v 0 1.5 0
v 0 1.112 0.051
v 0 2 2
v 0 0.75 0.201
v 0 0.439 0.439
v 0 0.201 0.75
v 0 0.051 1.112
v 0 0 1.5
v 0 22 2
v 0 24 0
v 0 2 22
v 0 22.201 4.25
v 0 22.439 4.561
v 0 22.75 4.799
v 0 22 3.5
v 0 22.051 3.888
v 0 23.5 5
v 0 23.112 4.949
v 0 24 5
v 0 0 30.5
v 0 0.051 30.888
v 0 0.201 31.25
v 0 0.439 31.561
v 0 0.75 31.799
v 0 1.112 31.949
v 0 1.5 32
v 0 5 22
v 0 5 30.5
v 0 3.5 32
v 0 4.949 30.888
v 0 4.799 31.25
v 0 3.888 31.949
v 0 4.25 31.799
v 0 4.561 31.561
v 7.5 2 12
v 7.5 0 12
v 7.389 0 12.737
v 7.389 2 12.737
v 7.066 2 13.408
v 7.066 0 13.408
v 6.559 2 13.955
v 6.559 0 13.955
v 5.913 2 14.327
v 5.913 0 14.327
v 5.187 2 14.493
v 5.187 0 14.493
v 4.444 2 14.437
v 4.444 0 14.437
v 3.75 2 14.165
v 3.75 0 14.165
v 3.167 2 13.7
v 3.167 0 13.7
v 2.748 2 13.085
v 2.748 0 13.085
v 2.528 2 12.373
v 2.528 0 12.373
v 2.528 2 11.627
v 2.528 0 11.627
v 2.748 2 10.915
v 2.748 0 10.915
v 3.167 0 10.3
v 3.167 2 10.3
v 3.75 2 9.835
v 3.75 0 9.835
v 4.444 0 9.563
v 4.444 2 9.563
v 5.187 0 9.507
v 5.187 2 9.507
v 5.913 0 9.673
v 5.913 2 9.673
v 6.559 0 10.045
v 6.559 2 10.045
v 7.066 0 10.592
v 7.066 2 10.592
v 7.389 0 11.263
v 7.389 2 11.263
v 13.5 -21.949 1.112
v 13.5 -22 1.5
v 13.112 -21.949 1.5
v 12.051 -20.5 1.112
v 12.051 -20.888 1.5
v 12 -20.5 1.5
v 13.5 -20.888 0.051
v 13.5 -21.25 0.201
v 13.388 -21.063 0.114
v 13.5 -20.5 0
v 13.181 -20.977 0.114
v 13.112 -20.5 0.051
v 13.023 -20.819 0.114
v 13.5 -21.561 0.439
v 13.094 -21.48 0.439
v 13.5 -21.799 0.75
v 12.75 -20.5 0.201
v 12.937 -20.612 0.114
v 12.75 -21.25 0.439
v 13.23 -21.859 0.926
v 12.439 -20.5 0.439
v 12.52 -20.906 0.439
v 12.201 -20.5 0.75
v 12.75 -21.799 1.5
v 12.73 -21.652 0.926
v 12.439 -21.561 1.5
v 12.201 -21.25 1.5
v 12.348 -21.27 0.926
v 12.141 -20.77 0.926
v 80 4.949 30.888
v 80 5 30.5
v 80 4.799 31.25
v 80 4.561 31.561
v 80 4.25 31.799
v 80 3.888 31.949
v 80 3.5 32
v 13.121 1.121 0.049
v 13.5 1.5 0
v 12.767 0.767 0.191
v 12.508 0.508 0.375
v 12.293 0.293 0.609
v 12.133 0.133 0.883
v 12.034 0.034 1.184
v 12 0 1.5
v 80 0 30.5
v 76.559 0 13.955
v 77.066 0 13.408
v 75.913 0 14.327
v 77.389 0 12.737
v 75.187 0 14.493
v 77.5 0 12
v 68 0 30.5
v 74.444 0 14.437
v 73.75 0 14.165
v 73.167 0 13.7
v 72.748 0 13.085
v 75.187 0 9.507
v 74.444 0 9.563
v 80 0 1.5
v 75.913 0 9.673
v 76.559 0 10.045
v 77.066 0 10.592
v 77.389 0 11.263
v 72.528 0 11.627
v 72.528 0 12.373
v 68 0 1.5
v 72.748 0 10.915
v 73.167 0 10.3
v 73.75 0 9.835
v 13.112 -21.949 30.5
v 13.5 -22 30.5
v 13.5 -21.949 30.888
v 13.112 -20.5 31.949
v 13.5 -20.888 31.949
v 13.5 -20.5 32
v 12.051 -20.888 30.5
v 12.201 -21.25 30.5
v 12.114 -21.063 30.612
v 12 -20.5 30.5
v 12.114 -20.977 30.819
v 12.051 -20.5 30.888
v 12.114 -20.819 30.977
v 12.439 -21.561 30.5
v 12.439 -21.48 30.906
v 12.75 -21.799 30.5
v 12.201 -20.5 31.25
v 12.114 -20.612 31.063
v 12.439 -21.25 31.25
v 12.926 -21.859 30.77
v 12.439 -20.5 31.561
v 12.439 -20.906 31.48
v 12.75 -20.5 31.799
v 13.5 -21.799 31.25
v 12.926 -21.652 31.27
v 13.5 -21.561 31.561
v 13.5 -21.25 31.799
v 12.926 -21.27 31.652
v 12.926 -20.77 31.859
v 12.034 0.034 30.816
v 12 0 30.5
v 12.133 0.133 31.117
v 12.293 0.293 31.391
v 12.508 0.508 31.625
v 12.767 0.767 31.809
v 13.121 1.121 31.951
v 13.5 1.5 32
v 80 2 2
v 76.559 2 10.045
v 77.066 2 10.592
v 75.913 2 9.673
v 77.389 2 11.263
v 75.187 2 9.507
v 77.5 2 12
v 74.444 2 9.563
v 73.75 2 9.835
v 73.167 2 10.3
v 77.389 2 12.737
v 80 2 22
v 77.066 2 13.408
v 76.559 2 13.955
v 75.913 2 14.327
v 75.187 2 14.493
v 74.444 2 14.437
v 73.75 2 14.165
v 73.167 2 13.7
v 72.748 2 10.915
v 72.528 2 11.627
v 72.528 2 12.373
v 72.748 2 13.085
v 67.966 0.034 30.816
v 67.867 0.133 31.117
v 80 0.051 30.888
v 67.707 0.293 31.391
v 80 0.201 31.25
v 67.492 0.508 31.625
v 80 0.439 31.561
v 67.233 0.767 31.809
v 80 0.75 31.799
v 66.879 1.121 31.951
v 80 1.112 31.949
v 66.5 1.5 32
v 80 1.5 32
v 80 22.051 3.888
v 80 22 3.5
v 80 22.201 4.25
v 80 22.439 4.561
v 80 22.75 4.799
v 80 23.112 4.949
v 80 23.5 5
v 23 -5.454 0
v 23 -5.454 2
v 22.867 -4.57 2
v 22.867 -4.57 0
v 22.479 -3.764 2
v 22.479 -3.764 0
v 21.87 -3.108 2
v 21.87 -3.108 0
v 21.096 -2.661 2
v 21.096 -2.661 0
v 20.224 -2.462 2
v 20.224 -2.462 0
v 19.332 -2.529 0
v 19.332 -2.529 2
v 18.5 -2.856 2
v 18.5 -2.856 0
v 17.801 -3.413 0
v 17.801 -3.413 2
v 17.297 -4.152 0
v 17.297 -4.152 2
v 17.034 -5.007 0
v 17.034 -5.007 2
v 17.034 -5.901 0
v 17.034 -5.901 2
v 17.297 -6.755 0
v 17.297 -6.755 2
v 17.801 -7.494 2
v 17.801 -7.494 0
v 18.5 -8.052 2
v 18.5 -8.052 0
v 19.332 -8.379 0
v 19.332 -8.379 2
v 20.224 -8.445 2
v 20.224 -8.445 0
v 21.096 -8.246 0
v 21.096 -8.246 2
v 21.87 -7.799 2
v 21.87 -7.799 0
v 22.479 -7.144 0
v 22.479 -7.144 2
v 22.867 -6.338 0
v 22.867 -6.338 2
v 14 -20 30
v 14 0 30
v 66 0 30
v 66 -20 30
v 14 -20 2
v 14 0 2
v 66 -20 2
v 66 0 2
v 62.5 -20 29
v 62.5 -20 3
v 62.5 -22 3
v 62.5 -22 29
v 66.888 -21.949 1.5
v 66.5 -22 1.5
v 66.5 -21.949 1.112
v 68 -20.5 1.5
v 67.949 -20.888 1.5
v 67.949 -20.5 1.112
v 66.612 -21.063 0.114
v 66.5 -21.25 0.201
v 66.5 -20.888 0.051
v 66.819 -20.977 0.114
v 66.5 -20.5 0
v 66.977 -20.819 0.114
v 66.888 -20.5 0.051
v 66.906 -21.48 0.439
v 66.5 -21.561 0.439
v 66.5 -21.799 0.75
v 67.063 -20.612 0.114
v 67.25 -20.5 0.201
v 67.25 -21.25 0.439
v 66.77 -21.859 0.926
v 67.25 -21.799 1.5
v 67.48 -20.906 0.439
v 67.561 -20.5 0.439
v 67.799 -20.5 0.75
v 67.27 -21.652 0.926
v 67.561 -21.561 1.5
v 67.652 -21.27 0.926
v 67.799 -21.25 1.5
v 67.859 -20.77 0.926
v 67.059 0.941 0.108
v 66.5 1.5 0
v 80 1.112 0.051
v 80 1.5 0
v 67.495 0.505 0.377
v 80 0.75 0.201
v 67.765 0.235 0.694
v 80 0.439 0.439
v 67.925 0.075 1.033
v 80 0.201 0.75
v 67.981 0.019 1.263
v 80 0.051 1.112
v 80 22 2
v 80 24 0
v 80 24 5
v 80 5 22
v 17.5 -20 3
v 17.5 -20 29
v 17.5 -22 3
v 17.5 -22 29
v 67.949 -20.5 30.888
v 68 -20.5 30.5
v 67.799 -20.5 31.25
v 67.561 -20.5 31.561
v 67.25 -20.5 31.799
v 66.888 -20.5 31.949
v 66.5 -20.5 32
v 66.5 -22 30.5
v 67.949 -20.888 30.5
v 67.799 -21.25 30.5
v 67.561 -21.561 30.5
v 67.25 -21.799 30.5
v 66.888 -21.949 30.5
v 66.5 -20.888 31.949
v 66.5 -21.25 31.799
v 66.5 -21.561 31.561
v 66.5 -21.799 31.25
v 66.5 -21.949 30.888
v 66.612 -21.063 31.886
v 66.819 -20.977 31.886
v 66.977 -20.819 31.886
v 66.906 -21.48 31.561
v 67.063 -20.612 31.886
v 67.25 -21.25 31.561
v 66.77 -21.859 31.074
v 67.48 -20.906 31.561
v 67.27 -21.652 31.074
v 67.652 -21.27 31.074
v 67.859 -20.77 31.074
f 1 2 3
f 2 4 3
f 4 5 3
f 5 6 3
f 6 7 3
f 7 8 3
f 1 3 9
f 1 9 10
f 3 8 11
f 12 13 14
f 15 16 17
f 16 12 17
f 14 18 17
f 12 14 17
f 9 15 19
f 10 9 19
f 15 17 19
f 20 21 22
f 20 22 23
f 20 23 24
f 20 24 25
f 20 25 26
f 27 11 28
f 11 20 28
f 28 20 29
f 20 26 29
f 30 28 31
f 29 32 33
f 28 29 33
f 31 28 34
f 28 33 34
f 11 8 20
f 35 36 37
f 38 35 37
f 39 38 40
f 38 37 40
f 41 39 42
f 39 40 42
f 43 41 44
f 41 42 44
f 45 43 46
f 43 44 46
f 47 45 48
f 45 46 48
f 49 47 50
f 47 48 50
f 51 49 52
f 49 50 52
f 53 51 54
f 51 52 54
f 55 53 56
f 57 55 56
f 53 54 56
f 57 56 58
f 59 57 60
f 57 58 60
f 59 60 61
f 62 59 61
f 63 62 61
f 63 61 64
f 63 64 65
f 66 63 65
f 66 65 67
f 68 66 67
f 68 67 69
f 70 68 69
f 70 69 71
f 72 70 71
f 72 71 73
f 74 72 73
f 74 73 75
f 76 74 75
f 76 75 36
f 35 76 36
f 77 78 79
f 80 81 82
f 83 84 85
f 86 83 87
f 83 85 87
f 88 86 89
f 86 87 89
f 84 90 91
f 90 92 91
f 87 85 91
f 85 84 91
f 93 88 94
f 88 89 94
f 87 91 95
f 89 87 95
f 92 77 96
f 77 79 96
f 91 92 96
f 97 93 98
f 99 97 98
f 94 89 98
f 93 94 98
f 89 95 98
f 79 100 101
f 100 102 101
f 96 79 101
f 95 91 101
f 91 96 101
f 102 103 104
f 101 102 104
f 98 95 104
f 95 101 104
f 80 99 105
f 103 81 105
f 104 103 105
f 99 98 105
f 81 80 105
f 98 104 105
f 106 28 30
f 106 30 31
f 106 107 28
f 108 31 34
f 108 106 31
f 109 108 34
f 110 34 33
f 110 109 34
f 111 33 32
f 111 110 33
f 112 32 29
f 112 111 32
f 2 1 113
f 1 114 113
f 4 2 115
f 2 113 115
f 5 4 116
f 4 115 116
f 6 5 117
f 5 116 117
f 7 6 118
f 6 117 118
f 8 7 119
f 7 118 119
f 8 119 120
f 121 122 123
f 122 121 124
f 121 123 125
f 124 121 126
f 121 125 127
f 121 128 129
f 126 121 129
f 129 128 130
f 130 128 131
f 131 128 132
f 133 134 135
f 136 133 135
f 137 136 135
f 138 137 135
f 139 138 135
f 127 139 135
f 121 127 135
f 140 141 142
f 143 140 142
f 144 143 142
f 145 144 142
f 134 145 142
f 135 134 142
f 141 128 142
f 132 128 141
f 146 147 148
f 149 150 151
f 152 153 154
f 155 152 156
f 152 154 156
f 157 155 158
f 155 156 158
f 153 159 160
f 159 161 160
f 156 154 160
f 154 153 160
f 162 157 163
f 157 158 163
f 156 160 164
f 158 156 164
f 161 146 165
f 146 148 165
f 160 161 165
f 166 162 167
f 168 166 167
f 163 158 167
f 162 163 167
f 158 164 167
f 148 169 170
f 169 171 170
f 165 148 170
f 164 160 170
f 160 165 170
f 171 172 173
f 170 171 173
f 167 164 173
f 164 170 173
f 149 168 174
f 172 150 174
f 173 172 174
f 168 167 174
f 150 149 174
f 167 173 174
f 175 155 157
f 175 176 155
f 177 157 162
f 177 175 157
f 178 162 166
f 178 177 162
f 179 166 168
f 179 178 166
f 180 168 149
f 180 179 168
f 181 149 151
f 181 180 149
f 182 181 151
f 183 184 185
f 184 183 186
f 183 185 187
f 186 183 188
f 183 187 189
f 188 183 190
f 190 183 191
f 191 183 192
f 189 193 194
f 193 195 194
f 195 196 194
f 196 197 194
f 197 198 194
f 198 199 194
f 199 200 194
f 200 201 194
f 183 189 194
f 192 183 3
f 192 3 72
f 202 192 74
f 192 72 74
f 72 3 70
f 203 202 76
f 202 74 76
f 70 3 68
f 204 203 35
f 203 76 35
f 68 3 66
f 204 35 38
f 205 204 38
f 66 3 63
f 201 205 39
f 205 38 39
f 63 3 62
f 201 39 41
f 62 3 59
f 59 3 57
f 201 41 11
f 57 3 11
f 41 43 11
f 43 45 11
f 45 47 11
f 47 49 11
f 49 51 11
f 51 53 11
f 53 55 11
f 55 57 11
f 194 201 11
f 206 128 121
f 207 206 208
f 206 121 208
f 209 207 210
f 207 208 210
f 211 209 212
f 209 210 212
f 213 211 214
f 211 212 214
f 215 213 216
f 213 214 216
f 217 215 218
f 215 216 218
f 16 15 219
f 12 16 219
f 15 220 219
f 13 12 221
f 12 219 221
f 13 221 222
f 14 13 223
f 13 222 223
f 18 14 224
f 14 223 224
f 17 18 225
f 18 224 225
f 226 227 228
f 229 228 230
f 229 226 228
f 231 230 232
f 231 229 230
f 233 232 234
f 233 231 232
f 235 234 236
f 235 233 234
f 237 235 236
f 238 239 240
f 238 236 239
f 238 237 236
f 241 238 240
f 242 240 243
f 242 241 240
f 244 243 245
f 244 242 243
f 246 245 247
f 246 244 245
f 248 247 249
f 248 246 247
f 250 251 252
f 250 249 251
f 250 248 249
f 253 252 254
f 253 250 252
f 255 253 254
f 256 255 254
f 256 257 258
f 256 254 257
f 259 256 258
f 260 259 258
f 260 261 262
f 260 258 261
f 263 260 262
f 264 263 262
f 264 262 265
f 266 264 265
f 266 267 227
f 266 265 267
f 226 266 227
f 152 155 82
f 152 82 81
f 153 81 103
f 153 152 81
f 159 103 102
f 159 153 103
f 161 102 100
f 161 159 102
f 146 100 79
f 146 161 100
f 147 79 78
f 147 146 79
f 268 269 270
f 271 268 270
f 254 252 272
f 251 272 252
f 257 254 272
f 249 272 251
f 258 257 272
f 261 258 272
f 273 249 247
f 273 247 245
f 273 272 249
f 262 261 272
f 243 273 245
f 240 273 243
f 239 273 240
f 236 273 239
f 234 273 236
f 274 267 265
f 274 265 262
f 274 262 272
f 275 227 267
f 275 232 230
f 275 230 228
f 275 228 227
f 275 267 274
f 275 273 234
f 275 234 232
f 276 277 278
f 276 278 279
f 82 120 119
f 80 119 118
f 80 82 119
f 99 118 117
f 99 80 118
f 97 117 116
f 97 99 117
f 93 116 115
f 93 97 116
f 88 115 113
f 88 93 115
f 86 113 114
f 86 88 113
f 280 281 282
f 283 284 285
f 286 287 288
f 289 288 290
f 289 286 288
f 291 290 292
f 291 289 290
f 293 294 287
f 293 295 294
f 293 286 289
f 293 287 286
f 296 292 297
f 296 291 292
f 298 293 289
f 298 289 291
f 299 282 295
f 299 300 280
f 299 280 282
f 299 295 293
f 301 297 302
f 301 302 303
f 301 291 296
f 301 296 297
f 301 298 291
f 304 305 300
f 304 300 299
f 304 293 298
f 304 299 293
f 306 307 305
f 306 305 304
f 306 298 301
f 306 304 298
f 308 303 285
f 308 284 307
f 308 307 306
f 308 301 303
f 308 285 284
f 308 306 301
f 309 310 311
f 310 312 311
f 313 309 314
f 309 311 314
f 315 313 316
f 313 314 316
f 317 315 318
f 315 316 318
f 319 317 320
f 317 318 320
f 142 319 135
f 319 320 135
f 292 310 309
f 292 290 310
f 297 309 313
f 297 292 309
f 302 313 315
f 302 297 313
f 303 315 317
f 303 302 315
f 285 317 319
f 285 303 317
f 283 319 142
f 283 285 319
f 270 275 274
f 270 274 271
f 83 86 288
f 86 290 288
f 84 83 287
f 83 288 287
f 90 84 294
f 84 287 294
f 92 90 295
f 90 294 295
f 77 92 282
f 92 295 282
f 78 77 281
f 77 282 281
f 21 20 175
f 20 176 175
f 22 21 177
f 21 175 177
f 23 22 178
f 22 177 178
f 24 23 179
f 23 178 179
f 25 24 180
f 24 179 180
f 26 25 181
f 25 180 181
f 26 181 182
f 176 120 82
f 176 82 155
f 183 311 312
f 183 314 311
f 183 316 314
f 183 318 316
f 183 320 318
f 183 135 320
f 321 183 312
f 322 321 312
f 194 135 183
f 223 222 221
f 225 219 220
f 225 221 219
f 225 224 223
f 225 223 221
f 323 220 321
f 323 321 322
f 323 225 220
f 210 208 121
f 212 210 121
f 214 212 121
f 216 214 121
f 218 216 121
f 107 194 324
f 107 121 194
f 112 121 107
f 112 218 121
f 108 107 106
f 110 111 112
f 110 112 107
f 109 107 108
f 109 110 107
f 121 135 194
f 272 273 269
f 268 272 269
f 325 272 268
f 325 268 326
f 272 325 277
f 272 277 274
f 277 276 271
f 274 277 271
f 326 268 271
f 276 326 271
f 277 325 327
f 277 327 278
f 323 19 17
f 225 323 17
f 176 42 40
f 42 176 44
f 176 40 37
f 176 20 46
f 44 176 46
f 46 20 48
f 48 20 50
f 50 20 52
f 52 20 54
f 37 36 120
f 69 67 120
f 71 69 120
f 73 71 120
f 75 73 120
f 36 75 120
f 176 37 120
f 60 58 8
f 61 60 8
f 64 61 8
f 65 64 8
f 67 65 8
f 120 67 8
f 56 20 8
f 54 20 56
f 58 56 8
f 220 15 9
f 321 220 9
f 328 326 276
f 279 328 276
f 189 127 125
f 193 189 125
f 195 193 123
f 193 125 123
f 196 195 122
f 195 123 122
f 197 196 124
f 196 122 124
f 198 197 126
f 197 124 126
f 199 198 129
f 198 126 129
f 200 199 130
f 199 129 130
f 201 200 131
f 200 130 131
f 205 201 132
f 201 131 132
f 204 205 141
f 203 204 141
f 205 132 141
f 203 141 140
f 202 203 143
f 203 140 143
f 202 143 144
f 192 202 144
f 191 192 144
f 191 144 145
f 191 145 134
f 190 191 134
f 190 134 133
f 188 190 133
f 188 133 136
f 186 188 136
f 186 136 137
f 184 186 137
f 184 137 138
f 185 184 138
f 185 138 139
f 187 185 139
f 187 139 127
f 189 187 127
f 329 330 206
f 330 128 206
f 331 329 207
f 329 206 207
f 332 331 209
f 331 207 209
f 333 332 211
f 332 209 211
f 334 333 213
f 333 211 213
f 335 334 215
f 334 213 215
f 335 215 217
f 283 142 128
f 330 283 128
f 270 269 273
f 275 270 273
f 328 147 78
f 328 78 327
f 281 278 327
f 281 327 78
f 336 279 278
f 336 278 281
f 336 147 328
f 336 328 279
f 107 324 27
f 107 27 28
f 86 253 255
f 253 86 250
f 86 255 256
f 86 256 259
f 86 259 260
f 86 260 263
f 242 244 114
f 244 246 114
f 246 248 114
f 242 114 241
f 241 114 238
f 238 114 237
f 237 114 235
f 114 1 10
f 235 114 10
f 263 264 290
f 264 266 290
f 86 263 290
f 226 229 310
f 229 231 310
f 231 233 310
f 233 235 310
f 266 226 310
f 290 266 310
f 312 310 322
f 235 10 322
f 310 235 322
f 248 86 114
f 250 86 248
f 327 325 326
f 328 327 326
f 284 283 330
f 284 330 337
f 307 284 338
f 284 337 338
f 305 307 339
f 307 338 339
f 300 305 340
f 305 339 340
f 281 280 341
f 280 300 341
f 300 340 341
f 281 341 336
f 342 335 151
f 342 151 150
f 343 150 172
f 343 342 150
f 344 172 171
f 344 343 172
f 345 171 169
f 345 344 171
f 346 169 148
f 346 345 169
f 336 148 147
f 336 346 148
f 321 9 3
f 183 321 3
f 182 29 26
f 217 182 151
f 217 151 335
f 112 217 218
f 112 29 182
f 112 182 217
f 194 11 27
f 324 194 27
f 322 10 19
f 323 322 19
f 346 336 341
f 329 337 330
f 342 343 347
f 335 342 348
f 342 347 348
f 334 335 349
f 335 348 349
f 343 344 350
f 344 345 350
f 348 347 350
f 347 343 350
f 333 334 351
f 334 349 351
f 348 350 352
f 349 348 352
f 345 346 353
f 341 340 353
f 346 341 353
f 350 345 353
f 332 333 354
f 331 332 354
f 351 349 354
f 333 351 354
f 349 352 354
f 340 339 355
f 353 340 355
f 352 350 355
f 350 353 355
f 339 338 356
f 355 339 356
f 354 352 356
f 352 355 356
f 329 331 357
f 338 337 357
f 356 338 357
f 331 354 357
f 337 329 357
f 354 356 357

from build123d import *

# Parameters (mm, degrees)
F1_DEPTH  = 80
F2_R      = 2.5
F3_DEPTH  = 10
F2_W      = 56
F2_H      = 32
F2_W_2    = 52
F2_H_2    = 28
F4_DEPTH  = 20
F6_W      = 56
F6_H      = 32
F6_W_2    = 45
F6_H_2    = 26
F7_DEPTH  = 2
F8_R      = 1.5
F9_R      = 3
F10_DEPTH = 10


with BuildPart() as f1:
    # F0 (on Right) → F1 (new body)
    with BuildSketch(Plane.YZ):
        Polygon((0, 32), (0, 0), (24, 0), (24, 5), (22, 5), (22, 2), (2, 2), (2, 22), (5, 22), (5, 32), align=None)
    extrude(amount=F1_DEPTH)

    # F2 (on Front) → F3 (cut)
    with BuildSketch(Plane.XZ):
        with Locations((5, 12)):
            Circle(F2_R)
        with Locations((75, 12)):
            Circle(F2_R)
    extrude(amount=-F3_DEPTH, mode=Mode.SUBTRACT)

    # F2 (on Front) → F4 (join)
    with BuildSketch(Plane.XZ):
        with Locations((40, 16)):
            Rectangle(F2_W, F2_H)
        with Locations((40, 16)):
            Rectangle(F2_W_2, F2_H_2, mode=Mode.SUBTRACT)
    extrude(amount=F4_DEPTH)

    # F6 (on offset) → F7 (join)
    with BuildSketch(Plane.XZ.offset(20)):
        with Locations((40, 16)):
            Rectangle(F6_W, F6_H)
        with Locations((40, 16)):
            Rectangle(F6_W_2, F6_H_2, mode=Mode.SUBTRACT)
    extrude(amount=F7_DEPTH)

    # F8
    f8_edges = [f1.edges().sort_by_distance(p)[0] for p in [
        (68, -22, 16),
        (40, -22, 32),
        (12, -22, 16),
        (40, -22, 0),
        (68, -11, 32),
        (12, -11, 32),
        (12, -11, 0),
        (68, -11, 0),
        (40, 22, 5),
        (40, 5, 32),
        (6, 0, 32),
        (74, 0, 32),
        (6, 0, 0),
        (74, 0, 0),
    ]]
    fillet(f8_edges, radius=F8_R)

    # F9 (on Top) → F10 (cut)
    with BuildSketch(Plane.XY):
        with Locations((20, -5.453821)):
            Circle(F9_R)
    extrude(amount=F10_DEPTH, mode=Mode.SUBTRACT)


solid = f1.part
